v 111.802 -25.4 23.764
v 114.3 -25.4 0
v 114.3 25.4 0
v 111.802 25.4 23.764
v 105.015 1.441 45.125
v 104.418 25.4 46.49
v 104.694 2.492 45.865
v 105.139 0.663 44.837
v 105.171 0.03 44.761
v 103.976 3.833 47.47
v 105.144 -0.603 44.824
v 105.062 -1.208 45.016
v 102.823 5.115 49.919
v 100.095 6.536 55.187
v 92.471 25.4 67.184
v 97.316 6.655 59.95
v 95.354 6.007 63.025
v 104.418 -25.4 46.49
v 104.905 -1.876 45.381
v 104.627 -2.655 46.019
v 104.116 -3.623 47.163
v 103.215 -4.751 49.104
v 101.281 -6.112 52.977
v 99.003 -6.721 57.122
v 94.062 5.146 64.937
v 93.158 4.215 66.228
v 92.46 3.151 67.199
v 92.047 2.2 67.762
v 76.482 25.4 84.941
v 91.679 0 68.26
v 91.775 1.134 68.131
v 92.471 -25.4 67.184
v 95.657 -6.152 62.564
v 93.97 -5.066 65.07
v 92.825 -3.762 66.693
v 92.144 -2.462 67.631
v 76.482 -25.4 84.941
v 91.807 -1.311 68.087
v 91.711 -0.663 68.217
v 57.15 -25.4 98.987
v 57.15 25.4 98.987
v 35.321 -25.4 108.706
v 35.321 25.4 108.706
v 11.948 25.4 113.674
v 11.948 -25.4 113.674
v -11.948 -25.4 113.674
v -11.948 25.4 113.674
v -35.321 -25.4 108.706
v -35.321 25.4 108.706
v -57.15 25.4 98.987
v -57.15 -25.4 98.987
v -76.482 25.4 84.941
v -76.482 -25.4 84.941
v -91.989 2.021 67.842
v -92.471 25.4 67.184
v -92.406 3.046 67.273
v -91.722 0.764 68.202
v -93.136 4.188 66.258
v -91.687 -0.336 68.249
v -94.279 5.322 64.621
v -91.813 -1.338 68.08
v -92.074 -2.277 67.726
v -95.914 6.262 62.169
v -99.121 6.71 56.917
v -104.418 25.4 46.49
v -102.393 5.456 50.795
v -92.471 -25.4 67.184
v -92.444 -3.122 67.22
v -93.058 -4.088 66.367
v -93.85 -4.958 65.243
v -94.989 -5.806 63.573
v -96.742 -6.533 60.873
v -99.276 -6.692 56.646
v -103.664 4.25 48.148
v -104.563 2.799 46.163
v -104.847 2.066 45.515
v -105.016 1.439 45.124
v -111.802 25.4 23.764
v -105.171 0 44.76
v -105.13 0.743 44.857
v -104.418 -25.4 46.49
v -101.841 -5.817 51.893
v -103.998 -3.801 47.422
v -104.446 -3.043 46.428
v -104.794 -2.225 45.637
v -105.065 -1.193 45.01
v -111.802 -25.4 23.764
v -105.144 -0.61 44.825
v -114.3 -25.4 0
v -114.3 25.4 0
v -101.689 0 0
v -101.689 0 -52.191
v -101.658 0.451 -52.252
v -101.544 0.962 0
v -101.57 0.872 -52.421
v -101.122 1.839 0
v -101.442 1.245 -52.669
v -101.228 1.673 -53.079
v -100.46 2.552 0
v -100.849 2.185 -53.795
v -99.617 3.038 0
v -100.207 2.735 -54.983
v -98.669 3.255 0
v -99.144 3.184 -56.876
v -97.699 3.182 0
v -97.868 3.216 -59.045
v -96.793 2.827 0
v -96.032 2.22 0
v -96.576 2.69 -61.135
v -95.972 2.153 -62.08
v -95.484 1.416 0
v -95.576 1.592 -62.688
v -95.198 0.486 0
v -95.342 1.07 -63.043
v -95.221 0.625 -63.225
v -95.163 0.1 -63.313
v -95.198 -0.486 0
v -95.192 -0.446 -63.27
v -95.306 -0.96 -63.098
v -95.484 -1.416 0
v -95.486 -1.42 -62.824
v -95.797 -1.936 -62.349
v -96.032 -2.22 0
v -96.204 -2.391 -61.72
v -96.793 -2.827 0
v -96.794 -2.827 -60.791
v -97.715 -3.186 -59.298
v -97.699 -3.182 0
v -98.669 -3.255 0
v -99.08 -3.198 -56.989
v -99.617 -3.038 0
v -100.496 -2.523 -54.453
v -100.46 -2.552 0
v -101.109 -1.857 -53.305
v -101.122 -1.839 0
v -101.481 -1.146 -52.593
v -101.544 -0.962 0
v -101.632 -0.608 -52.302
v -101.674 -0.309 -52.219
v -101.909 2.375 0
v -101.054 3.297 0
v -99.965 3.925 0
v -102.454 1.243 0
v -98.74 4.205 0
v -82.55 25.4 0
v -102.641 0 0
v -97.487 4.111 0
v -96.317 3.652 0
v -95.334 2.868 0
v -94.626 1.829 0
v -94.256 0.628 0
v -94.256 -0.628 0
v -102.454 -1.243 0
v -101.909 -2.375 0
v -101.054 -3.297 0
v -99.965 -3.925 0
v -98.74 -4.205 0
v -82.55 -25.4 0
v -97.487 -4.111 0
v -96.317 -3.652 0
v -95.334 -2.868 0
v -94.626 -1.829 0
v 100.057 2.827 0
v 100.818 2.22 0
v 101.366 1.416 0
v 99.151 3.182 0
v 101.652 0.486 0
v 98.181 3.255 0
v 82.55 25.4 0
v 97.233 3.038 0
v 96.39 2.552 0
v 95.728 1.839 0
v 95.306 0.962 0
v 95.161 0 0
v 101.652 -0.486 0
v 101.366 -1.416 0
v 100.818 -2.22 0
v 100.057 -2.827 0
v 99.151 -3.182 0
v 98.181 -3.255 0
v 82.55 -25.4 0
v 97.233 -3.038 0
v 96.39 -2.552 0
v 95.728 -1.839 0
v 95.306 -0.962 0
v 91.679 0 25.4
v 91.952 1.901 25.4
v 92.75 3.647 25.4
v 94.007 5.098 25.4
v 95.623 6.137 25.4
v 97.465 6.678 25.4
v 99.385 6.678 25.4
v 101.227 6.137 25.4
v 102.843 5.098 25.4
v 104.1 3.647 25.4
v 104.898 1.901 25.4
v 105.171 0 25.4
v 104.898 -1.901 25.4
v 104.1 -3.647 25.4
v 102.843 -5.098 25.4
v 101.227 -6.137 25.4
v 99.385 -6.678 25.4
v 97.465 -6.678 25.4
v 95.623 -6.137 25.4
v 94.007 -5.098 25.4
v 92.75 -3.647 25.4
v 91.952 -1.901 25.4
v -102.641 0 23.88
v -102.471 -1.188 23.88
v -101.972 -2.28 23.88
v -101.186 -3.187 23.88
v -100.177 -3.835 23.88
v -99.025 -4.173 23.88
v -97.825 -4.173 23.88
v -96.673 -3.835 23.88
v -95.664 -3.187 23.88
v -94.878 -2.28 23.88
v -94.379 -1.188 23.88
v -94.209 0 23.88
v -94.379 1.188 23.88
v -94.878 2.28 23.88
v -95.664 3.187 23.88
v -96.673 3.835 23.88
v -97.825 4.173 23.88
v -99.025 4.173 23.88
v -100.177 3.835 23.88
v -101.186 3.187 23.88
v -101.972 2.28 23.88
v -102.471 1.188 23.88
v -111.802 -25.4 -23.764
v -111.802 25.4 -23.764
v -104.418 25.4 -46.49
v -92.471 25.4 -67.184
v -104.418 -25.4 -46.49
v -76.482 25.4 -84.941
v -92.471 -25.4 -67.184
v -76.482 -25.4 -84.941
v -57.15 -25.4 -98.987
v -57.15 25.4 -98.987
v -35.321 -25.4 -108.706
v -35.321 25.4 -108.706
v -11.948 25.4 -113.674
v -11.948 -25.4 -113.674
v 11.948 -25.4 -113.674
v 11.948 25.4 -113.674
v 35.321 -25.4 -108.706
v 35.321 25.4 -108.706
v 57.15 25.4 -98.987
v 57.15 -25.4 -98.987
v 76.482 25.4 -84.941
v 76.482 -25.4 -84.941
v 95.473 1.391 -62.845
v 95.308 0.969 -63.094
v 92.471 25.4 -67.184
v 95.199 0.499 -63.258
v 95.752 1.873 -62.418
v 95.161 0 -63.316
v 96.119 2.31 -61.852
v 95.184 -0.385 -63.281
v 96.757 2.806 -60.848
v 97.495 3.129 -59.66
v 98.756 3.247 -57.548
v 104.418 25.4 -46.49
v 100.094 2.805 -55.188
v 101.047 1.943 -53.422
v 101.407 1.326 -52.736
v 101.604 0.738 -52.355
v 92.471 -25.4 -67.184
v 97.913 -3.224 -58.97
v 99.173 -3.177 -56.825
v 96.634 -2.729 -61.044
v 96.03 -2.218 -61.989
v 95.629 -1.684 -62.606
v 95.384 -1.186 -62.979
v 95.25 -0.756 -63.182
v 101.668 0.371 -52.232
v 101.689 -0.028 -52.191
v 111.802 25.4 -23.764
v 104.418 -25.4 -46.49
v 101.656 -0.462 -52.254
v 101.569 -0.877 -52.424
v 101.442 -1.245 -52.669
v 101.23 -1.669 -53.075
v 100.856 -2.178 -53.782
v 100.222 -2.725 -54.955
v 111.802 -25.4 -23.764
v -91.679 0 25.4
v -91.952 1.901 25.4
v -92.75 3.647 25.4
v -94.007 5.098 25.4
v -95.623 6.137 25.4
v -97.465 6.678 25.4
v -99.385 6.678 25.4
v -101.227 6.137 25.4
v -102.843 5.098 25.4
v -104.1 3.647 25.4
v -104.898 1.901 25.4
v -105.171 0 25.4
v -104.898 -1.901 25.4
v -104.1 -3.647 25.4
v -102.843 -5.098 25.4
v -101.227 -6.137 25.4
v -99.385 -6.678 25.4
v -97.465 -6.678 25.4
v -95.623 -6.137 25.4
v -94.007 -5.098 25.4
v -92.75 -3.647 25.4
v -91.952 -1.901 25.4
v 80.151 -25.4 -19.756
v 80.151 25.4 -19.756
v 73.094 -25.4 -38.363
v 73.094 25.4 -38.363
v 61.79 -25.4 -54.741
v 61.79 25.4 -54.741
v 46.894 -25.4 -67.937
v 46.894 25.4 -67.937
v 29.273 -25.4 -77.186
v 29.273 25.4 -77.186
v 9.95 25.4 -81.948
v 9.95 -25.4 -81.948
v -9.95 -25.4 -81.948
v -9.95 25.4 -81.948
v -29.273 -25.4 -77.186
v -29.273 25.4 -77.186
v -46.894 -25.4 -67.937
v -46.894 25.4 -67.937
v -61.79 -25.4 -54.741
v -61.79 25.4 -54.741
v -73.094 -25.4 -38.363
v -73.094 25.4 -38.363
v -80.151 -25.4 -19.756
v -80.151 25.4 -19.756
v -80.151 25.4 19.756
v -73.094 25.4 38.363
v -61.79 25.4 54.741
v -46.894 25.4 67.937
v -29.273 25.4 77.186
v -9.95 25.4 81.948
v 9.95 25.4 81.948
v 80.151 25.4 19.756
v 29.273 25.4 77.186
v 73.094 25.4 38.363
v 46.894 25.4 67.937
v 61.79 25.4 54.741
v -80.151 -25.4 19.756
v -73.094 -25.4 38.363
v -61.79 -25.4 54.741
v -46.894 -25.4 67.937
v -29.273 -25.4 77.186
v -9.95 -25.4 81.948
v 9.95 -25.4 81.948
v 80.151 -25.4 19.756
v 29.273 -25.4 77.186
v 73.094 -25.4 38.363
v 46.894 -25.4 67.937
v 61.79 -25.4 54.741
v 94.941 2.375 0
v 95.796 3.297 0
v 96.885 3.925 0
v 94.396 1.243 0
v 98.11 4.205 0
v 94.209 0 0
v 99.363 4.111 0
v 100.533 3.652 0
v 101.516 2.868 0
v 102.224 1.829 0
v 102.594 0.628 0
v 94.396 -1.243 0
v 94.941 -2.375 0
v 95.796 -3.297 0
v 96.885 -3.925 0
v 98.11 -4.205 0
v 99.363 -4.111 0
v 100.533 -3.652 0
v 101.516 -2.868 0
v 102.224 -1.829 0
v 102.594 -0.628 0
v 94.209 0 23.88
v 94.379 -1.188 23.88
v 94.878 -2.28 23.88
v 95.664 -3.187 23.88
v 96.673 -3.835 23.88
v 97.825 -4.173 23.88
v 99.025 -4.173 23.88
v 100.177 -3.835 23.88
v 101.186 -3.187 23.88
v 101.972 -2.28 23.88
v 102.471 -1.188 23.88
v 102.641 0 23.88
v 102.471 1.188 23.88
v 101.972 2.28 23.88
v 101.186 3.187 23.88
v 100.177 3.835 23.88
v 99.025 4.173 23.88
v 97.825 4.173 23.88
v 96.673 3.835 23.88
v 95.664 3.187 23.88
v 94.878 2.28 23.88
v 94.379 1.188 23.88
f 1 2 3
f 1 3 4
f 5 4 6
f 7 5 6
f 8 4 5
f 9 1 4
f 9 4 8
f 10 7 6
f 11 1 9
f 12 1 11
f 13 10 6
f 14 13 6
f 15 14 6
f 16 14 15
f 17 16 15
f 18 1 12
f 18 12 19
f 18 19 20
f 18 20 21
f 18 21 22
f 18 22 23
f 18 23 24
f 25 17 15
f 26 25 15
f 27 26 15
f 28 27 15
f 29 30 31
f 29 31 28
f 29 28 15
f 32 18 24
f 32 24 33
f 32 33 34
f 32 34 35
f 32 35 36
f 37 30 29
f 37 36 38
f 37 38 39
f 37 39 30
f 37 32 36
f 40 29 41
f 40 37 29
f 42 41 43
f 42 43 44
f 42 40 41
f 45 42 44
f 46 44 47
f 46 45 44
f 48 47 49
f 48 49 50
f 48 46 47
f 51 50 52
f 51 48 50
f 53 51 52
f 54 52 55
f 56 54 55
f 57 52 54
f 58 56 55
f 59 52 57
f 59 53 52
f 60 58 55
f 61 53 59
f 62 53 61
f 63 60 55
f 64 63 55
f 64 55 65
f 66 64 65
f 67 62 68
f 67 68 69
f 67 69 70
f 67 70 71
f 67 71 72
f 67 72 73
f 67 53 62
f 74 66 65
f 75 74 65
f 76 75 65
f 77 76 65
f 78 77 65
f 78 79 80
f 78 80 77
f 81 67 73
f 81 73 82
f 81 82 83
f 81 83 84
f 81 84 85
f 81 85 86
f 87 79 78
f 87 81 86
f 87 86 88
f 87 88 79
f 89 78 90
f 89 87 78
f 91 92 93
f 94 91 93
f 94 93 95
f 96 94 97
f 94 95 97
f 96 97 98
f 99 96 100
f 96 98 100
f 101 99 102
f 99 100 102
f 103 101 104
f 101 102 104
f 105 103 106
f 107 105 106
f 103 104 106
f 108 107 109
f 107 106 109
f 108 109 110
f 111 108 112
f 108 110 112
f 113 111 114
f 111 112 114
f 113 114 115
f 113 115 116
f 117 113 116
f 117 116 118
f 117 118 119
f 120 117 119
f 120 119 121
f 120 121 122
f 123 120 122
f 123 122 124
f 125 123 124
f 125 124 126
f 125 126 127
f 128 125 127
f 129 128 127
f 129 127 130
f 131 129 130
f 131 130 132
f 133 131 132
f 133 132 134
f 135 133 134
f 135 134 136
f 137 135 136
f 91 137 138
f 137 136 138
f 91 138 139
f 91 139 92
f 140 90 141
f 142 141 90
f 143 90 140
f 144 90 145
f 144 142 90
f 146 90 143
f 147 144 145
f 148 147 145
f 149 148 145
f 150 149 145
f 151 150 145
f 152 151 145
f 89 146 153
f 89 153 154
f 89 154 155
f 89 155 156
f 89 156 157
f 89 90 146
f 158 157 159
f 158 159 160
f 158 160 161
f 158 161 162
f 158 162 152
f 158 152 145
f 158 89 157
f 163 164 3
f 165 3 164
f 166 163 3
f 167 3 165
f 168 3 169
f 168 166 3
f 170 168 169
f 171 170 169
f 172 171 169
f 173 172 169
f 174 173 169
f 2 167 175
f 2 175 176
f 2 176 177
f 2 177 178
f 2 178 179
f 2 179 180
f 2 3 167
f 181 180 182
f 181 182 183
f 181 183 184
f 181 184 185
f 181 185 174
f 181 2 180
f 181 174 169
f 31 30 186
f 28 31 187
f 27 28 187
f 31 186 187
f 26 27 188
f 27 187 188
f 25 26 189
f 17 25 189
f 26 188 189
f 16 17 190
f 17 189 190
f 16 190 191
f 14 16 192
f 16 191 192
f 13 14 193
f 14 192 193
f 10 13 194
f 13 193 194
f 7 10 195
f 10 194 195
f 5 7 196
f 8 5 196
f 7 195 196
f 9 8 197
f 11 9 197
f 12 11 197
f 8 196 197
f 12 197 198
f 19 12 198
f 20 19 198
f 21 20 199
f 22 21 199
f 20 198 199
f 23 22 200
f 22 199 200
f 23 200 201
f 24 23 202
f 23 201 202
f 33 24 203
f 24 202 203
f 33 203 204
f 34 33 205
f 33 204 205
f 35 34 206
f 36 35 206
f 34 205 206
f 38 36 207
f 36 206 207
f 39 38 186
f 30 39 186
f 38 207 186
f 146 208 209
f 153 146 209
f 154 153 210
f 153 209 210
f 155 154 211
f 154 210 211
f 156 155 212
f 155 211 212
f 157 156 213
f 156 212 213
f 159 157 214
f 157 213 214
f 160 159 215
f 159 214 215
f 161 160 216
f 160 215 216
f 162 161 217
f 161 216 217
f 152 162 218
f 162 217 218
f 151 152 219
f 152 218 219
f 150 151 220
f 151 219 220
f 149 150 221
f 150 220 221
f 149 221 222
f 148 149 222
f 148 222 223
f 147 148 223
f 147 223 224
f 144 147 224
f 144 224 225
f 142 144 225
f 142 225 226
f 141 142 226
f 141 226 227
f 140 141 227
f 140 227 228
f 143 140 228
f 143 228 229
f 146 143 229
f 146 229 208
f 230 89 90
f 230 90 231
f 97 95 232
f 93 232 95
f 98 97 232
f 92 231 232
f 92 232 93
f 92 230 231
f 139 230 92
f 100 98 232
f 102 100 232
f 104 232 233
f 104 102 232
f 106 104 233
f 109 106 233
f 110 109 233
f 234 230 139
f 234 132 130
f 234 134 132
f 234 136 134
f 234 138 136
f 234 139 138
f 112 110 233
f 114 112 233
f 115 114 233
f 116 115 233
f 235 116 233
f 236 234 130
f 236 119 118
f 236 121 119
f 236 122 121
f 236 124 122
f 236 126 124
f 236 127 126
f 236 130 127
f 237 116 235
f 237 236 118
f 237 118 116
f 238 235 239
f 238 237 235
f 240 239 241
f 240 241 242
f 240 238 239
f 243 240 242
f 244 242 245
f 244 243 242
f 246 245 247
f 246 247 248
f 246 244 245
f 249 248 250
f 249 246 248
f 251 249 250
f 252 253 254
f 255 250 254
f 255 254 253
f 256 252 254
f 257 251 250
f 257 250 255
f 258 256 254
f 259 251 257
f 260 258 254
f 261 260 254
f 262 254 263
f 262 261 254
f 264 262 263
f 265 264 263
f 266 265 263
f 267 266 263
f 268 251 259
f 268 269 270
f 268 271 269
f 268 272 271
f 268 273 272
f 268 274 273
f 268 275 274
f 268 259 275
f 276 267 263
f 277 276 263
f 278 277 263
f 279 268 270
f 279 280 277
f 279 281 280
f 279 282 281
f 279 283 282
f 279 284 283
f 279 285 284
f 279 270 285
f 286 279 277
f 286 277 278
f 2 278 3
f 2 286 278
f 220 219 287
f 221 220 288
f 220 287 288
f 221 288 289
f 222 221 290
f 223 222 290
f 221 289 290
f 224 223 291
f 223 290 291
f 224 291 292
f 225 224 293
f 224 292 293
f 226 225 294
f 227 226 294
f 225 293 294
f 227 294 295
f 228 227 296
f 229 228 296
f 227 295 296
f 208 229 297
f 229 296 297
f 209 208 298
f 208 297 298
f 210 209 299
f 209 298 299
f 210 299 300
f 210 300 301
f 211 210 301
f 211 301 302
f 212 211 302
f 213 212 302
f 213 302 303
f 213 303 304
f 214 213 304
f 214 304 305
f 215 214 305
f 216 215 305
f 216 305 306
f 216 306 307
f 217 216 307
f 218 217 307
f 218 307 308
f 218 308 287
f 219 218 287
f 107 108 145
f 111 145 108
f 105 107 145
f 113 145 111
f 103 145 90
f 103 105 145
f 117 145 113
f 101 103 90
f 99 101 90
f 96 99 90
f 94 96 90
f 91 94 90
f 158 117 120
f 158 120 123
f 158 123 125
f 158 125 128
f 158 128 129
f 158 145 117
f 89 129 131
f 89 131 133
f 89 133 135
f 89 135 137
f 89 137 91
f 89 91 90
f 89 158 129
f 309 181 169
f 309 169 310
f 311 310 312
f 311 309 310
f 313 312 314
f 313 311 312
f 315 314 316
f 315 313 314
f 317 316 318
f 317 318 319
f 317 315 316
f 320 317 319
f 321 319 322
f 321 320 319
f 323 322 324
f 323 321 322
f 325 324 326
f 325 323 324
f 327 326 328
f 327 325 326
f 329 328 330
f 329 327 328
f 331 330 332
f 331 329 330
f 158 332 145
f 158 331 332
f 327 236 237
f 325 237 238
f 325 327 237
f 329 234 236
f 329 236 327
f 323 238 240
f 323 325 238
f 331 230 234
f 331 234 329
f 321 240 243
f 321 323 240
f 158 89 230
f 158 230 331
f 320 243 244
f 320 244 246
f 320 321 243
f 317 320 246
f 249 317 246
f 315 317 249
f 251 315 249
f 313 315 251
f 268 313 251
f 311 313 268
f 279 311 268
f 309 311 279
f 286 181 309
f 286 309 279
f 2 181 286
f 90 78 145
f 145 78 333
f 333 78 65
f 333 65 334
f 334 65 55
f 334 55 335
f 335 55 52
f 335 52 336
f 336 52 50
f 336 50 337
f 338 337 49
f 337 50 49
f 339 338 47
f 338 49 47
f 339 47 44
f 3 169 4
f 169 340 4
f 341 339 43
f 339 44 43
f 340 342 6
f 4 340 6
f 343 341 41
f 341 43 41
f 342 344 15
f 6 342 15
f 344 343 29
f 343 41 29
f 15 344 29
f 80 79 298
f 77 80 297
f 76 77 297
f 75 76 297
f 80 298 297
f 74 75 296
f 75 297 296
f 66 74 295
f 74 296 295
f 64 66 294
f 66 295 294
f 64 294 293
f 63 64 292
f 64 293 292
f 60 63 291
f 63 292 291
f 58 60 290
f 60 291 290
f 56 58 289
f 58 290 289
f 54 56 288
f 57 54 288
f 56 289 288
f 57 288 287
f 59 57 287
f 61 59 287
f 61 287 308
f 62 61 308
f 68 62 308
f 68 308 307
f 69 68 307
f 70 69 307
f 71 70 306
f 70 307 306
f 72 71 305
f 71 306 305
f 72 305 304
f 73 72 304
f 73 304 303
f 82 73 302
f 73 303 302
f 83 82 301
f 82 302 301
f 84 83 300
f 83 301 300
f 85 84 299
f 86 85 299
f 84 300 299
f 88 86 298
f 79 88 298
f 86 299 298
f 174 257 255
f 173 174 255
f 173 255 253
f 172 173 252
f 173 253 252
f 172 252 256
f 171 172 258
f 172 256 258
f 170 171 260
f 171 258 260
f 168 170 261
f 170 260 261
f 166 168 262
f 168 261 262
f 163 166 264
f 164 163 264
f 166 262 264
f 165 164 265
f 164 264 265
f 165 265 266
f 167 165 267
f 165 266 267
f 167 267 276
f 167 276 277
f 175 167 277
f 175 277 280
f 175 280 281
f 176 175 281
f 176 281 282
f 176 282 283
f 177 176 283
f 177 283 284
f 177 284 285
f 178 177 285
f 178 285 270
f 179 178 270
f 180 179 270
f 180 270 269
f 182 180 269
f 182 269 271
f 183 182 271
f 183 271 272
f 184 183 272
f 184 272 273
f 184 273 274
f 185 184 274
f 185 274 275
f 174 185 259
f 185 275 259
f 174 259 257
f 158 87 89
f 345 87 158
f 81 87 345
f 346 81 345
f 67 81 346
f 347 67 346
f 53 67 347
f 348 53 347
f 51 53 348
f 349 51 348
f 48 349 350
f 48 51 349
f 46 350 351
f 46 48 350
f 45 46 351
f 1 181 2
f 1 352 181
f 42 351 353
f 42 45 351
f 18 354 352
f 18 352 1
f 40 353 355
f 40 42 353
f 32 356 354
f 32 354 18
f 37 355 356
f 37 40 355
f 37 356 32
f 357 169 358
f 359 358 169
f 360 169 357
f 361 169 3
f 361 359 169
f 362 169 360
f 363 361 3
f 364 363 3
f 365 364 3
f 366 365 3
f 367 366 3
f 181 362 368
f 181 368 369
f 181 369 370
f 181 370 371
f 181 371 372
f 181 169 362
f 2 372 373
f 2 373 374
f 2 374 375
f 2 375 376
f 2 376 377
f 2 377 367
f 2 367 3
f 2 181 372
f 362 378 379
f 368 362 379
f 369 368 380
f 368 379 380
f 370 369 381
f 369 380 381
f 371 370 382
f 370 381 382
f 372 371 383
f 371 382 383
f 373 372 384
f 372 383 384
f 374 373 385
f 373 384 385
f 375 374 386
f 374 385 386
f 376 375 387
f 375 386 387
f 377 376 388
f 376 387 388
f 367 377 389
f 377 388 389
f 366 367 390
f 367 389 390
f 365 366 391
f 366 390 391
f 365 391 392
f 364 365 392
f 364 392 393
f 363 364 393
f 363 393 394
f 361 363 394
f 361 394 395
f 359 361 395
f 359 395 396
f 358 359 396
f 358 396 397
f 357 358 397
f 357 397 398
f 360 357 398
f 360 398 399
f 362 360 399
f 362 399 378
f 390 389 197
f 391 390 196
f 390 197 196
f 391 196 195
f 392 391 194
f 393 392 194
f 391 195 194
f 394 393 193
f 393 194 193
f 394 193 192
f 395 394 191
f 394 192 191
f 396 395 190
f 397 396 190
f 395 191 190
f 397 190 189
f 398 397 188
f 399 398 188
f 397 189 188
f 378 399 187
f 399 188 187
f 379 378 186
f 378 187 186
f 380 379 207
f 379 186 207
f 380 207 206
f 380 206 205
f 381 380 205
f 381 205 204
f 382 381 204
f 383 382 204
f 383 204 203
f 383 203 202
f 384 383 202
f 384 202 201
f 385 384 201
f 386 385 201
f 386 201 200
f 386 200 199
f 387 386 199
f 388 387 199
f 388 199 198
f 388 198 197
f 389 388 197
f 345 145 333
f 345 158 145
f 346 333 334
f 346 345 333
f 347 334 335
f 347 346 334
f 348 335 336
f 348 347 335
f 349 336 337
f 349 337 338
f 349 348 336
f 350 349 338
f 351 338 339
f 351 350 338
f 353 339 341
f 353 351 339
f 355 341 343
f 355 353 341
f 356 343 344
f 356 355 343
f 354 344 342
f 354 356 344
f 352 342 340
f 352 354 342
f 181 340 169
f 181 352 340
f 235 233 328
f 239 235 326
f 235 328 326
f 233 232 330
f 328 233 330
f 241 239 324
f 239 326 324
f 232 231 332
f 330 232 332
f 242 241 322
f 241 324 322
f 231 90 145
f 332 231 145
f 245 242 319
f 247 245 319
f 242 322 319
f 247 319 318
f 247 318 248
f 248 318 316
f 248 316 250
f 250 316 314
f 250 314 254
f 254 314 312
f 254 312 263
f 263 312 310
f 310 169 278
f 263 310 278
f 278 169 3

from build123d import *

# Parameters (mm, degrees)
F1_DEPTH  = 25.4
F3_DEPTH  = 50.8
F5_D      = 6.5278
F7_D      = 8.4328
F11_D     = 13.49248
F11_DEPTH = 88.9
F11_TIP   = 4.0535499425


with BuildPart() as f1:
    # F0 (on Front) → F1 (new body, symmetric)
    with BuildSketch(Plane.XZ):
        with BuildLine():
            Line((82.55, 0), (114.3, 0))
            ThreePointArc((114.3, 0), (0, 114.3), (-114.3, 0))
            Line((-114.3, 0), (-82.55, 0))
            ThreePointArc((-82.55, 0), (0, 82.55), (82.55, 0))
        make_face()
    extrude(amount=F1_DEPTH, both=True)

    # F7 (through all)
    with Locations(Plane(origin=(0, 0, 0), x_dir=(1, 0, 0), z_dir=(0, 0, -1))):
        with Locations((-98.425, 0), (98.425, 0)):
            Hole(F7_D / 2)

    # F11
    with Locations(Plane.XY.offset(114.3)):
        with Locations((-98.425, 0), (98.425, 0)):
            Hole(F11_D / 2, depth=F11_DEPTH)
            with Locations((0, 0, -(F11_DEPTH + F11_TIP / 2))):  # 118° drill point
                Cone(0, F11_D / 2, F11_TIP, mode=Mode.SUBTRACT)


with BuildPart() as f3:
    # F2 (on face) → F3 (new body, through all)
    with BuildSketch(Plane.XZ.offset(25.4)):
        with BuildLine():
            ThreePointArc((82.55, 0), (0, -82.55), (-82.55, 0))
            Line((-82.55, 0), (-114.3, 0))
            ThreePointArc((-114.3, 0), (0, -114.3), (114.3, 0))
            Line((114.3, 0), (82.55, 0))
        make_face()
    extrude(amount=-F3_DEPTH)

    # F5 (through all)
    with Locations(Plane.XY):
        with Locations((-98.425, 0), (98.425, 0)):
            Hole(F5_D / 2)


solid = Compound([f1.part, f3.part])
